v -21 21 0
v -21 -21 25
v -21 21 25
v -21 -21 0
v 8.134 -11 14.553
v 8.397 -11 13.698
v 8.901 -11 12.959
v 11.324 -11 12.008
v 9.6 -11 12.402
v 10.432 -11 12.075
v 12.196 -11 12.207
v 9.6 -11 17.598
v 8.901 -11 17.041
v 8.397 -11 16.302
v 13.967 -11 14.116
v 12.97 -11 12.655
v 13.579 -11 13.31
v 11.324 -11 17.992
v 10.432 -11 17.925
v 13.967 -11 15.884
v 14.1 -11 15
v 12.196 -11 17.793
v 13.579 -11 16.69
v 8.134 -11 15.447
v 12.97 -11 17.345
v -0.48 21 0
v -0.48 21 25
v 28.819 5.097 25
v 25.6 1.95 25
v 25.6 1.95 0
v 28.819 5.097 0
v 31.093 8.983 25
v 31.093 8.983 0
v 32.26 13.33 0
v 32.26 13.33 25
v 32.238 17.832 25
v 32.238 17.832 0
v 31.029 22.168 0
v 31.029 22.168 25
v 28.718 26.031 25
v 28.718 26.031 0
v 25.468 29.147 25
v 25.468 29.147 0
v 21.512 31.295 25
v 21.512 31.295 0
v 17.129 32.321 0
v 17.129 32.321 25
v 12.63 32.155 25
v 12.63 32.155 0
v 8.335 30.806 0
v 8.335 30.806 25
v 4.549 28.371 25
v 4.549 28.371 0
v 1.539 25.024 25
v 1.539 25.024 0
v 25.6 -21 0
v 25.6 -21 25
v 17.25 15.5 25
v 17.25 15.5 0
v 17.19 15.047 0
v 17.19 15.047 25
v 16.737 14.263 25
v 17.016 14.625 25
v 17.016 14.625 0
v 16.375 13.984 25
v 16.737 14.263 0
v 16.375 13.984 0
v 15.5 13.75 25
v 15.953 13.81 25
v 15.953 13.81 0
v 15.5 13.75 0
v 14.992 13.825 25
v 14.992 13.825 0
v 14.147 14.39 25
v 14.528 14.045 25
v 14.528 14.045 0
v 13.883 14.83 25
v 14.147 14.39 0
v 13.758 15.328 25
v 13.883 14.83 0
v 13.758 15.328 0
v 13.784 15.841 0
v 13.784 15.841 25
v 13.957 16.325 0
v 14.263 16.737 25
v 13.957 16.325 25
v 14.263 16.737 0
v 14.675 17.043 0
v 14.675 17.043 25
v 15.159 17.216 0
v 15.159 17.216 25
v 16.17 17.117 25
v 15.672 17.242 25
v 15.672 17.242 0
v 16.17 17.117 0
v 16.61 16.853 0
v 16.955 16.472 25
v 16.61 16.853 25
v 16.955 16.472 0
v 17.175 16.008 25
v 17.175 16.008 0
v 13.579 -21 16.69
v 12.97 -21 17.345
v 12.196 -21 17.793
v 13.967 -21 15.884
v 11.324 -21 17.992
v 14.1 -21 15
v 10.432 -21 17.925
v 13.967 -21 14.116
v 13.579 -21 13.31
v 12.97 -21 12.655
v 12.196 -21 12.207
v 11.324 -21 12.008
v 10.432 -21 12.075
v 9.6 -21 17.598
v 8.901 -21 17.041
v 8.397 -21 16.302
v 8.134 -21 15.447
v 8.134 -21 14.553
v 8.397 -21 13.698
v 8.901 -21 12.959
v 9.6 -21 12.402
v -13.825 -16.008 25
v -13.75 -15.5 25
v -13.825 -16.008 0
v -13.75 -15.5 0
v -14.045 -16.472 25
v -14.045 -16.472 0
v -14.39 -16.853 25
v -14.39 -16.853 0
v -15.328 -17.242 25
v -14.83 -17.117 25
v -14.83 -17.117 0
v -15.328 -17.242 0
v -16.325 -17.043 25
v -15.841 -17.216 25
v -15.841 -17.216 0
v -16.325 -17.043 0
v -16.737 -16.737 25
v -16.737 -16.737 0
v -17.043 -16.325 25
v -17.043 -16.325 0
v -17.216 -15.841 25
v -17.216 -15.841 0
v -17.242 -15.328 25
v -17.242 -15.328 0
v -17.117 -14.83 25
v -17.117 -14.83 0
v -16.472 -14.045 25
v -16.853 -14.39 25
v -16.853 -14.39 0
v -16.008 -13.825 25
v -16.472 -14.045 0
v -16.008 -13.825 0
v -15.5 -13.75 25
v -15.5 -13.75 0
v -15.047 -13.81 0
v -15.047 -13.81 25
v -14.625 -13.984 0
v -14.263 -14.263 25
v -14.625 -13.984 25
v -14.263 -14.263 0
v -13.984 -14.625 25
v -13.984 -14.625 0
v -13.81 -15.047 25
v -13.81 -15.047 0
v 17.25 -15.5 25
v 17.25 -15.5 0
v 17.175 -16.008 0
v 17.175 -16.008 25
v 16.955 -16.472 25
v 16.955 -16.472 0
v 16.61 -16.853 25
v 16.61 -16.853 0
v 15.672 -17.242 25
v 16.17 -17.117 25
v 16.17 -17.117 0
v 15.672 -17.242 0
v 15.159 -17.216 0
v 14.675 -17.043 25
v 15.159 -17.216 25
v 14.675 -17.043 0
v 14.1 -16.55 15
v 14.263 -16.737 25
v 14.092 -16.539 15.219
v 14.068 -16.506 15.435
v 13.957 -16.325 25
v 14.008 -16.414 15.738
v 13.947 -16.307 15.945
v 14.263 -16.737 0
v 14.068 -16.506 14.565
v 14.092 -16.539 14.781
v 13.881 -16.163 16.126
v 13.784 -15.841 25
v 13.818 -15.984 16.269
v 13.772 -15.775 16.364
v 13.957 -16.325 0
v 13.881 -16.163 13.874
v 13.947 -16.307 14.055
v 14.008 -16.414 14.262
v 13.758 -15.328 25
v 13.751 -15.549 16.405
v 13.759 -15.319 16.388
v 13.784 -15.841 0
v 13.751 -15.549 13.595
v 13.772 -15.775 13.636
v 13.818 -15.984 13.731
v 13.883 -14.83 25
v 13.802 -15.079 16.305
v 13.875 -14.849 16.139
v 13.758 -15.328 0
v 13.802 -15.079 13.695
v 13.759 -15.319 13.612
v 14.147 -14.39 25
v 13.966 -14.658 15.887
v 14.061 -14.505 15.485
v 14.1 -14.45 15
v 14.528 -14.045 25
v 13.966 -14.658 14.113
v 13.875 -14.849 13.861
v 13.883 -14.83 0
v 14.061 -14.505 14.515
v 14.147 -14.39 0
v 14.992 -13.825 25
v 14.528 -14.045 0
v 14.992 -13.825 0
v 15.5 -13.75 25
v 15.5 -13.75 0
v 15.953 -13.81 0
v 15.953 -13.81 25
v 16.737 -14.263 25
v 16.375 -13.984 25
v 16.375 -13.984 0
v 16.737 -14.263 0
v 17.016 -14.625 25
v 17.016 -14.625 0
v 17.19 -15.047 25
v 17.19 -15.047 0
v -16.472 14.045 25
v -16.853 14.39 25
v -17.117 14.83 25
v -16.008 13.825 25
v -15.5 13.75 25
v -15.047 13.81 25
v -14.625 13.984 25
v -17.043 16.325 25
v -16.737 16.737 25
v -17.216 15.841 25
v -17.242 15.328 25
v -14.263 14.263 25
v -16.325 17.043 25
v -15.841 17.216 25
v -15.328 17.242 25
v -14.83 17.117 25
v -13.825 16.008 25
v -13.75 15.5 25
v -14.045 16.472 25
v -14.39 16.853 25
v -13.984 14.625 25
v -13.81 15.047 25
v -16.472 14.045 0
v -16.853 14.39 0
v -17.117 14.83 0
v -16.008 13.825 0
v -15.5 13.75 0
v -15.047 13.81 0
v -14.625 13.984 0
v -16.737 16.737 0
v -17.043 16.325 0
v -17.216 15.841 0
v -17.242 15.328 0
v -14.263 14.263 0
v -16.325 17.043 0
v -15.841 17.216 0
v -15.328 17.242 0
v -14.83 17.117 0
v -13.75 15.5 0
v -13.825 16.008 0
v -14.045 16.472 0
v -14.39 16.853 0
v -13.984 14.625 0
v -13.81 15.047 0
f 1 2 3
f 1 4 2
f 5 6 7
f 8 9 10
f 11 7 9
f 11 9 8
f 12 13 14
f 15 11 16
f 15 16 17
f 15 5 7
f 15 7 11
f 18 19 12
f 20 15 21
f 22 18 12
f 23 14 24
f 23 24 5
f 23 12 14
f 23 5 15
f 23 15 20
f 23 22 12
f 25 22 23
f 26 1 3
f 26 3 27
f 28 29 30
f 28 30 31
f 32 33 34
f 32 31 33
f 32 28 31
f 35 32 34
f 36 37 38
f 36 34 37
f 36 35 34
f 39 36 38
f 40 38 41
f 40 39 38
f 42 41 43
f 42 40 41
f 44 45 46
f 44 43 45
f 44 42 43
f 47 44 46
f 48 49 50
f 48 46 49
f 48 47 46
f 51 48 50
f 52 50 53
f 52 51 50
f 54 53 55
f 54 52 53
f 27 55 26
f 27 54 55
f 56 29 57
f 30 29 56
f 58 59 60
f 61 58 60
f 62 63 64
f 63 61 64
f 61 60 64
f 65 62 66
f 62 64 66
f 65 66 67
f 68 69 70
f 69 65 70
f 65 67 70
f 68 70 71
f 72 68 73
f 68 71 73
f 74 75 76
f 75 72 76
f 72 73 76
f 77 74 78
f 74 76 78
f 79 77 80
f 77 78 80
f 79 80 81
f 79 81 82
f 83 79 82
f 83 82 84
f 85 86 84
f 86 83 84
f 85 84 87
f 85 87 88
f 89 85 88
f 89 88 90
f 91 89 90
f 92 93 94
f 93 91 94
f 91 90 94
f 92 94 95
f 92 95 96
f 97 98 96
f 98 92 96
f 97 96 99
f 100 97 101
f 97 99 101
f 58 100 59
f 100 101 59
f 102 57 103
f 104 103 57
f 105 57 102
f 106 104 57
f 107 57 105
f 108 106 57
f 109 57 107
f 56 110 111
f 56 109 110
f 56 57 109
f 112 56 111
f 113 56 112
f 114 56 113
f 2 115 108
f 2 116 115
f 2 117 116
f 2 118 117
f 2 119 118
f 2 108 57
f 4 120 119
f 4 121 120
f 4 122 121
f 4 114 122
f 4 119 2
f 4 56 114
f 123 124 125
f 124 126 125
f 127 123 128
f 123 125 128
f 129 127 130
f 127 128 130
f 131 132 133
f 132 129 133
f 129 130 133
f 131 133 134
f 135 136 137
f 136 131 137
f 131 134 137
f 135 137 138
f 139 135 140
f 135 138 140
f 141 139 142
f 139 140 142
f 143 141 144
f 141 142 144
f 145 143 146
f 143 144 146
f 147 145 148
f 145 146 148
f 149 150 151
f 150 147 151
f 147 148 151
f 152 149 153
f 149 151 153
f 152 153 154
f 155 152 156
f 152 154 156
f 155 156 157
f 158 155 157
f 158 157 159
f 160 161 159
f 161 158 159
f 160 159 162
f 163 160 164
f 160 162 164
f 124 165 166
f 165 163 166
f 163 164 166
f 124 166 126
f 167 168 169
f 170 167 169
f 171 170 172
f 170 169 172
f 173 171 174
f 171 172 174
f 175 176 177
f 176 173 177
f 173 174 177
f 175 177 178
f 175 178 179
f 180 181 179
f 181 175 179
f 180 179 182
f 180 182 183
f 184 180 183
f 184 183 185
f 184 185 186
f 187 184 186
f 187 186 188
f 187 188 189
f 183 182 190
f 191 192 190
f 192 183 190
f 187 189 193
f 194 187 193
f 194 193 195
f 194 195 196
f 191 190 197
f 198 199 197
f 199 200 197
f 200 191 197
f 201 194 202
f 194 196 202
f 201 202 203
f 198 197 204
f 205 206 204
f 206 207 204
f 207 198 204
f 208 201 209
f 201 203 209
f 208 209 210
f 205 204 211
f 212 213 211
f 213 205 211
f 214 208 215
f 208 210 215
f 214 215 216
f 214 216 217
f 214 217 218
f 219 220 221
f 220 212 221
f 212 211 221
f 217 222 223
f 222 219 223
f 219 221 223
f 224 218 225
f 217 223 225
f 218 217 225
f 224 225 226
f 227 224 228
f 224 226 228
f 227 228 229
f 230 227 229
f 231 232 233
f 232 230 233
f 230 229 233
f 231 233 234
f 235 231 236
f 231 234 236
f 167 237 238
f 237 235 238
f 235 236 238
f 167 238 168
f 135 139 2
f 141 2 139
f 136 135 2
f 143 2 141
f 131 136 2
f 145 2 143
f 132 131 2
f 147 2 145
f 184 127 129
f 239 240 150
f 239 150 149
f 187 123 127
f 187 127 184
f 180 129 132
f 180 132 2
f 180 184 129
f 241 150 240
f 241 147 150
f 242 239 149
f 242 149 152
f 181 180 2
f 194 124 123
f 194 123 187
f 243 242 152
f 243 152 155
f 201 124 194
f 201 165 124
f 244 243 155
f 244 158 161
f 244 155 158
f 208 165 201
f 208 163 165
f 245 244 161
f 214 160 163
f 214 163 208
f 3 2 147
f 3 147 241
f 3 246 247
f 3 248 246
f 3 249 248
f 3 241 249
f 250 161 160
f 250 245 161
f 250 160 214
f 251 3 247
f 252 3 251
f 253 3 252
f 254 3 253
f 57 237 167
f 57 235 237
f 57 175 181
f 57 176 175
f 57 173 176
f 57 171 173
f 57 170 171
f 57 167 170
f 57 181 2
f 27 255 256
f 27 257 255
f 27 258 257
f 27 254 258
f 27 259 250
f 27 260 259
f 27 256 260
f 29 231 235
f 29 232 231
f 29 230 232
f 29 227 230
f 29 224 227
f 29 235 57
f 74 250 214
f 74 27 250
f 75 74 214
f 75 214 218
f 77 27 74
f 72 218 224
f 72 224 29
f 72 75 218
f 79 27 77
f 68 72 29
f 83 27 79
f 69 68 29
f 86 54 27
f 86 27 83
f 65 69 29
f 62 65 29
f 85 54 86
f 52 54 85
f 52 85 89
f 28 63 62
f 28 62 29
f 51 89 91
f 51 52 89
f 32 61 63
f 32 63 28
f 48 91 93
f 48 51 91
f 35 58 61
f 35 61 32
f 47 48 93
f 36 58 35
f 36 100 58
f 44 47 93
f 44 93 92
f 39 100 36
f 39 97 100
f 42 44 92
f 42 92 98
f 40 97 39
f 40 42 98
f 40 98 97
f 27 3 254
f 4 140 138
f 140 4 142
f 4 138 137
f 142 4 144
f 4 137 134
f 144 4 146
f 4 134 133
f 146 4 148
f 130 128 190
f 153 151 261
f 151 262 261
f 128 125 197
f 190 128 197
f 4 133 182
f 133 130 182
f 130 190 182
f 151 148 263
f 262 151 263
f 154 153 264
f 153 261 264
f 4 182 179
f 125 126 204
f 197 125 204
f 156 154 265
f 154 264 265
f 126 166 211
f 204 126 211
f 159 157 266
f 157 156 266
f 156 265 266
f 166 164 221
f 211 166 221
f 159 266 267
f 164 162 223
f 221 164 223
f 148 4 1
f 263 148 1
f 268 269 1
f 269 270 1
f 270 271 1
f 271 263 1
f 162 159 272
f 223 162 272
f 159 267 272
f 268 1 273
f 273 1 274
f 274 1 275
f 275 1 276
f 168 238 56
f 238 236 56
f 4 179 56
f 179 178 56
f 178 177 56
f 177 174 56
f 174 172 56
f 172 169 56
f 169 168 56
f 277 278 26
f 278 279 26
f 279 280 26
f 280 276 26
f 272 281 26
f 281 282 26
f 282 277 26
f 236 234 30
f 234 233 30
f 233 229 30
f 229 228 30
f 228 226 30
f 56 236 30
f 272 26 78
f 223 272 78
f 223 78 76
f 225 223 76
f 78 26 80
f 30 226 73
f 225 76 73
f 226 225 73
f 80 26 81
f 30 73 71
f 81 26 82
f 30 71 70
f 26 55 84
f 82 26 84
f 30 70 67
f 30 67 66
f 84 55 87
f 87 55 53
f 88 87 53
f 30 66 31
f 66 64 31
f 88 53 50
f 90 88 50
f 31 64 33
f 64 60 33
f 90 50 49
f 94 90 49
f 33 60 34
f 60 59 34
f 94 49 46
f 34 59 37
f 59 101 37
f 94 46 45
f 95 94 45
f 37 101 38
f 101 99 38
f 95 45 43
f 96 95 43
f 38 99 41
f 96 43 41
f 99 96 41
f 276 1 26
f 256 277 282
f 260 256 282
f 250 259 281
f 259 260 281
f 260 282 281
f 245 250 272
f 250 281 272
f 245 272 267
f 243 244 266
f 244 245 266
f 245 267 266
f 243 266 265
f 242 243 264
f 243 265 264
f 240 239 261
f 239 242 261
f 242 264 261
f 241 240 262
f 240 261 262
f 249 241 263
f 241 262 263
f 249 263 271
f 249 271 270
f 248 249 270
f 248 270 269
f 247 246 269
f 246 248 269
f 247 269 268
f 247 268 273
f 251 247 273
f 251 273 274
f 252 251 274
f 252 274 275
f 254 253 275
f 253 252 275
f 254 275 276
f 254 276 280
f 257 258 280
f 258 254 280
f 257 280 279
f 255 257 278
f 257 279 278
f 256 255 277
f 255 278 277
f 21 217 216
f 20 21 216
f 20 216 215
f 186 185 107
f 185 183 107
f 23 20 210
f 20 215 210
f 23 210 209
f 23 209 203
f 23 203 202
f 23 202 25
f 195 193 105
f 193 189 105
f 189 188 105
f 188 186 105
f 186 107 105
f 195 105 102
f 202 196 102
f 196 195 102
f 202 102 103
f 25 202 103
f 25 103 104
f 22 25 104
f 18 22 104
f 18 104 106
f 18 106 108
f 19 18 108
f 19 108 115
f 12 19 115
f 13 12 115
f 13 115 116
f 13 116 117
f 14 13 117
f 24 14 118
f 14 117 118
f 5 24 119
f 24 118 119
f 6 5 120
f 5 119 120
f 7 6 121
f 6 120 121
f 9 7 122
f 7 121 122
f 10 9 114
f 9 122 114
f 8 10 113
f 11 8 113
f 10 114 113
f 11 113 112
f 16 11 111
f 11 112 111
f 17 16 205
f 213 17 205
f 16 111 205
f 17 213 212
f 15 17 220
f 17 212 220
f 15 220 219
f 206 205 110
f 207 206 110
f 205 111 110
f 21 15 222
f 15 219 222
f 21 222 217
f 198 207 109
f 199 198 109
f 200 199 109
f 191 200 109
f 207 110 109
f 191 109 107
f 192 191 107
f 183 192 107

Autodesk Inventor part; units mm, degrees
ref_plane "YZ Plane" through (0, 0, 0) normal (1, 0, 0) x (0, 1, 0)
ref_plane "XZ Plane" through (0, 0, 0) normal (0, 1, 0) x (-1, 0, 0)
ref_plane "XY Plane" through (0, 0, 0) normal (0, 0, 1) x (1, 0, 0)
sketch "Sketch1" plane through (0, 0, 0) normal (0, 0, 1) x (1, 0, 0)
  line L0 (-21, 21) -> (21, 21)
  line L1 (21, 21) -> (21, -21)
  line L2 (21, -21) -> (-21, -21)
  line L3 (-21, -21) -> (-21, 21)
  line L4 (15.5, 15.5) -> (-15.5, 15.5) construction
  line L5 (-15.5, 15.5) -> (-15.5, -15.5)
  line L6 (-15.5, -15.5) -> (15.5, -15.5) construction
  line L7 (15.5, -15.5) -> (15.5, 15.5)
  circle A0 centre (-15.5, 15.5) radius 1.75
  circle A1 centre (15.5, 15.5) radius 1.75
  circle A2 centre (-15.5, -15.5) radius 1.75
  circle A3 centre (15.5, -15.5) radius 1.75
  point P0 (0, 0)
  point P1 (0, 0)
  dimension "d0" = 42
  dimension "d1" = 5.5
  dimension "d2" = 3.5
extrude "Extrusion1" add sketch "Sketch1" along normal blind 25
sketch "Sketch2" plane through (21, -21, 0) normal (1, 0, 0) x (0, 0, -1)
  line L0 (0, 42) -> (0, 0) projected
  line L1 (0, 42) -> (-25, 42) projected
  line L2 (-25, 0) -> (-25, 42) projected
  line L3 (0, 0) -> (-25, 0) projected
  point P0 (0, 21)
extrude "Extrusion2" add sketch "Sketch2" along normal blind 4.6
sketch "Sketch3" plane through (0, 0, 25) normal (0, 0, 1) x (1, 0, 0)
  circle A0 centre (15.5, 15.5) radius 1.75 projected
  line L0 (25.6, 21) -> (25.6, -21) projected
  circle A1 centre (15.5, 15.5) radius 16.9
  line L1 (25.6, 15.5) -> (32.4, 15.5)
  point P0 (0, 0)
  dimension "d7" = 16.9
extrude "Extrusion3" add sketch "Sketch3" against normal up to surface (25 mm away)
sketch "Sketch4" plane through (-21, -21, 0) normal (0, -1, 0) x (1, 0, 0)
  line L0 (46.6, 0) -> (0, 0) projected
  circle A0 centre (32.1, 15) radius 3
  point P0 (21, 0)
  dimension "d11" = 11.1
  dimension "d12" = 15
  dimension "d13" = 6
extrude "Extrusion4" cut sketch "Sketch4" against normal blind 10
properties part number "TITAN MOCKUP"
